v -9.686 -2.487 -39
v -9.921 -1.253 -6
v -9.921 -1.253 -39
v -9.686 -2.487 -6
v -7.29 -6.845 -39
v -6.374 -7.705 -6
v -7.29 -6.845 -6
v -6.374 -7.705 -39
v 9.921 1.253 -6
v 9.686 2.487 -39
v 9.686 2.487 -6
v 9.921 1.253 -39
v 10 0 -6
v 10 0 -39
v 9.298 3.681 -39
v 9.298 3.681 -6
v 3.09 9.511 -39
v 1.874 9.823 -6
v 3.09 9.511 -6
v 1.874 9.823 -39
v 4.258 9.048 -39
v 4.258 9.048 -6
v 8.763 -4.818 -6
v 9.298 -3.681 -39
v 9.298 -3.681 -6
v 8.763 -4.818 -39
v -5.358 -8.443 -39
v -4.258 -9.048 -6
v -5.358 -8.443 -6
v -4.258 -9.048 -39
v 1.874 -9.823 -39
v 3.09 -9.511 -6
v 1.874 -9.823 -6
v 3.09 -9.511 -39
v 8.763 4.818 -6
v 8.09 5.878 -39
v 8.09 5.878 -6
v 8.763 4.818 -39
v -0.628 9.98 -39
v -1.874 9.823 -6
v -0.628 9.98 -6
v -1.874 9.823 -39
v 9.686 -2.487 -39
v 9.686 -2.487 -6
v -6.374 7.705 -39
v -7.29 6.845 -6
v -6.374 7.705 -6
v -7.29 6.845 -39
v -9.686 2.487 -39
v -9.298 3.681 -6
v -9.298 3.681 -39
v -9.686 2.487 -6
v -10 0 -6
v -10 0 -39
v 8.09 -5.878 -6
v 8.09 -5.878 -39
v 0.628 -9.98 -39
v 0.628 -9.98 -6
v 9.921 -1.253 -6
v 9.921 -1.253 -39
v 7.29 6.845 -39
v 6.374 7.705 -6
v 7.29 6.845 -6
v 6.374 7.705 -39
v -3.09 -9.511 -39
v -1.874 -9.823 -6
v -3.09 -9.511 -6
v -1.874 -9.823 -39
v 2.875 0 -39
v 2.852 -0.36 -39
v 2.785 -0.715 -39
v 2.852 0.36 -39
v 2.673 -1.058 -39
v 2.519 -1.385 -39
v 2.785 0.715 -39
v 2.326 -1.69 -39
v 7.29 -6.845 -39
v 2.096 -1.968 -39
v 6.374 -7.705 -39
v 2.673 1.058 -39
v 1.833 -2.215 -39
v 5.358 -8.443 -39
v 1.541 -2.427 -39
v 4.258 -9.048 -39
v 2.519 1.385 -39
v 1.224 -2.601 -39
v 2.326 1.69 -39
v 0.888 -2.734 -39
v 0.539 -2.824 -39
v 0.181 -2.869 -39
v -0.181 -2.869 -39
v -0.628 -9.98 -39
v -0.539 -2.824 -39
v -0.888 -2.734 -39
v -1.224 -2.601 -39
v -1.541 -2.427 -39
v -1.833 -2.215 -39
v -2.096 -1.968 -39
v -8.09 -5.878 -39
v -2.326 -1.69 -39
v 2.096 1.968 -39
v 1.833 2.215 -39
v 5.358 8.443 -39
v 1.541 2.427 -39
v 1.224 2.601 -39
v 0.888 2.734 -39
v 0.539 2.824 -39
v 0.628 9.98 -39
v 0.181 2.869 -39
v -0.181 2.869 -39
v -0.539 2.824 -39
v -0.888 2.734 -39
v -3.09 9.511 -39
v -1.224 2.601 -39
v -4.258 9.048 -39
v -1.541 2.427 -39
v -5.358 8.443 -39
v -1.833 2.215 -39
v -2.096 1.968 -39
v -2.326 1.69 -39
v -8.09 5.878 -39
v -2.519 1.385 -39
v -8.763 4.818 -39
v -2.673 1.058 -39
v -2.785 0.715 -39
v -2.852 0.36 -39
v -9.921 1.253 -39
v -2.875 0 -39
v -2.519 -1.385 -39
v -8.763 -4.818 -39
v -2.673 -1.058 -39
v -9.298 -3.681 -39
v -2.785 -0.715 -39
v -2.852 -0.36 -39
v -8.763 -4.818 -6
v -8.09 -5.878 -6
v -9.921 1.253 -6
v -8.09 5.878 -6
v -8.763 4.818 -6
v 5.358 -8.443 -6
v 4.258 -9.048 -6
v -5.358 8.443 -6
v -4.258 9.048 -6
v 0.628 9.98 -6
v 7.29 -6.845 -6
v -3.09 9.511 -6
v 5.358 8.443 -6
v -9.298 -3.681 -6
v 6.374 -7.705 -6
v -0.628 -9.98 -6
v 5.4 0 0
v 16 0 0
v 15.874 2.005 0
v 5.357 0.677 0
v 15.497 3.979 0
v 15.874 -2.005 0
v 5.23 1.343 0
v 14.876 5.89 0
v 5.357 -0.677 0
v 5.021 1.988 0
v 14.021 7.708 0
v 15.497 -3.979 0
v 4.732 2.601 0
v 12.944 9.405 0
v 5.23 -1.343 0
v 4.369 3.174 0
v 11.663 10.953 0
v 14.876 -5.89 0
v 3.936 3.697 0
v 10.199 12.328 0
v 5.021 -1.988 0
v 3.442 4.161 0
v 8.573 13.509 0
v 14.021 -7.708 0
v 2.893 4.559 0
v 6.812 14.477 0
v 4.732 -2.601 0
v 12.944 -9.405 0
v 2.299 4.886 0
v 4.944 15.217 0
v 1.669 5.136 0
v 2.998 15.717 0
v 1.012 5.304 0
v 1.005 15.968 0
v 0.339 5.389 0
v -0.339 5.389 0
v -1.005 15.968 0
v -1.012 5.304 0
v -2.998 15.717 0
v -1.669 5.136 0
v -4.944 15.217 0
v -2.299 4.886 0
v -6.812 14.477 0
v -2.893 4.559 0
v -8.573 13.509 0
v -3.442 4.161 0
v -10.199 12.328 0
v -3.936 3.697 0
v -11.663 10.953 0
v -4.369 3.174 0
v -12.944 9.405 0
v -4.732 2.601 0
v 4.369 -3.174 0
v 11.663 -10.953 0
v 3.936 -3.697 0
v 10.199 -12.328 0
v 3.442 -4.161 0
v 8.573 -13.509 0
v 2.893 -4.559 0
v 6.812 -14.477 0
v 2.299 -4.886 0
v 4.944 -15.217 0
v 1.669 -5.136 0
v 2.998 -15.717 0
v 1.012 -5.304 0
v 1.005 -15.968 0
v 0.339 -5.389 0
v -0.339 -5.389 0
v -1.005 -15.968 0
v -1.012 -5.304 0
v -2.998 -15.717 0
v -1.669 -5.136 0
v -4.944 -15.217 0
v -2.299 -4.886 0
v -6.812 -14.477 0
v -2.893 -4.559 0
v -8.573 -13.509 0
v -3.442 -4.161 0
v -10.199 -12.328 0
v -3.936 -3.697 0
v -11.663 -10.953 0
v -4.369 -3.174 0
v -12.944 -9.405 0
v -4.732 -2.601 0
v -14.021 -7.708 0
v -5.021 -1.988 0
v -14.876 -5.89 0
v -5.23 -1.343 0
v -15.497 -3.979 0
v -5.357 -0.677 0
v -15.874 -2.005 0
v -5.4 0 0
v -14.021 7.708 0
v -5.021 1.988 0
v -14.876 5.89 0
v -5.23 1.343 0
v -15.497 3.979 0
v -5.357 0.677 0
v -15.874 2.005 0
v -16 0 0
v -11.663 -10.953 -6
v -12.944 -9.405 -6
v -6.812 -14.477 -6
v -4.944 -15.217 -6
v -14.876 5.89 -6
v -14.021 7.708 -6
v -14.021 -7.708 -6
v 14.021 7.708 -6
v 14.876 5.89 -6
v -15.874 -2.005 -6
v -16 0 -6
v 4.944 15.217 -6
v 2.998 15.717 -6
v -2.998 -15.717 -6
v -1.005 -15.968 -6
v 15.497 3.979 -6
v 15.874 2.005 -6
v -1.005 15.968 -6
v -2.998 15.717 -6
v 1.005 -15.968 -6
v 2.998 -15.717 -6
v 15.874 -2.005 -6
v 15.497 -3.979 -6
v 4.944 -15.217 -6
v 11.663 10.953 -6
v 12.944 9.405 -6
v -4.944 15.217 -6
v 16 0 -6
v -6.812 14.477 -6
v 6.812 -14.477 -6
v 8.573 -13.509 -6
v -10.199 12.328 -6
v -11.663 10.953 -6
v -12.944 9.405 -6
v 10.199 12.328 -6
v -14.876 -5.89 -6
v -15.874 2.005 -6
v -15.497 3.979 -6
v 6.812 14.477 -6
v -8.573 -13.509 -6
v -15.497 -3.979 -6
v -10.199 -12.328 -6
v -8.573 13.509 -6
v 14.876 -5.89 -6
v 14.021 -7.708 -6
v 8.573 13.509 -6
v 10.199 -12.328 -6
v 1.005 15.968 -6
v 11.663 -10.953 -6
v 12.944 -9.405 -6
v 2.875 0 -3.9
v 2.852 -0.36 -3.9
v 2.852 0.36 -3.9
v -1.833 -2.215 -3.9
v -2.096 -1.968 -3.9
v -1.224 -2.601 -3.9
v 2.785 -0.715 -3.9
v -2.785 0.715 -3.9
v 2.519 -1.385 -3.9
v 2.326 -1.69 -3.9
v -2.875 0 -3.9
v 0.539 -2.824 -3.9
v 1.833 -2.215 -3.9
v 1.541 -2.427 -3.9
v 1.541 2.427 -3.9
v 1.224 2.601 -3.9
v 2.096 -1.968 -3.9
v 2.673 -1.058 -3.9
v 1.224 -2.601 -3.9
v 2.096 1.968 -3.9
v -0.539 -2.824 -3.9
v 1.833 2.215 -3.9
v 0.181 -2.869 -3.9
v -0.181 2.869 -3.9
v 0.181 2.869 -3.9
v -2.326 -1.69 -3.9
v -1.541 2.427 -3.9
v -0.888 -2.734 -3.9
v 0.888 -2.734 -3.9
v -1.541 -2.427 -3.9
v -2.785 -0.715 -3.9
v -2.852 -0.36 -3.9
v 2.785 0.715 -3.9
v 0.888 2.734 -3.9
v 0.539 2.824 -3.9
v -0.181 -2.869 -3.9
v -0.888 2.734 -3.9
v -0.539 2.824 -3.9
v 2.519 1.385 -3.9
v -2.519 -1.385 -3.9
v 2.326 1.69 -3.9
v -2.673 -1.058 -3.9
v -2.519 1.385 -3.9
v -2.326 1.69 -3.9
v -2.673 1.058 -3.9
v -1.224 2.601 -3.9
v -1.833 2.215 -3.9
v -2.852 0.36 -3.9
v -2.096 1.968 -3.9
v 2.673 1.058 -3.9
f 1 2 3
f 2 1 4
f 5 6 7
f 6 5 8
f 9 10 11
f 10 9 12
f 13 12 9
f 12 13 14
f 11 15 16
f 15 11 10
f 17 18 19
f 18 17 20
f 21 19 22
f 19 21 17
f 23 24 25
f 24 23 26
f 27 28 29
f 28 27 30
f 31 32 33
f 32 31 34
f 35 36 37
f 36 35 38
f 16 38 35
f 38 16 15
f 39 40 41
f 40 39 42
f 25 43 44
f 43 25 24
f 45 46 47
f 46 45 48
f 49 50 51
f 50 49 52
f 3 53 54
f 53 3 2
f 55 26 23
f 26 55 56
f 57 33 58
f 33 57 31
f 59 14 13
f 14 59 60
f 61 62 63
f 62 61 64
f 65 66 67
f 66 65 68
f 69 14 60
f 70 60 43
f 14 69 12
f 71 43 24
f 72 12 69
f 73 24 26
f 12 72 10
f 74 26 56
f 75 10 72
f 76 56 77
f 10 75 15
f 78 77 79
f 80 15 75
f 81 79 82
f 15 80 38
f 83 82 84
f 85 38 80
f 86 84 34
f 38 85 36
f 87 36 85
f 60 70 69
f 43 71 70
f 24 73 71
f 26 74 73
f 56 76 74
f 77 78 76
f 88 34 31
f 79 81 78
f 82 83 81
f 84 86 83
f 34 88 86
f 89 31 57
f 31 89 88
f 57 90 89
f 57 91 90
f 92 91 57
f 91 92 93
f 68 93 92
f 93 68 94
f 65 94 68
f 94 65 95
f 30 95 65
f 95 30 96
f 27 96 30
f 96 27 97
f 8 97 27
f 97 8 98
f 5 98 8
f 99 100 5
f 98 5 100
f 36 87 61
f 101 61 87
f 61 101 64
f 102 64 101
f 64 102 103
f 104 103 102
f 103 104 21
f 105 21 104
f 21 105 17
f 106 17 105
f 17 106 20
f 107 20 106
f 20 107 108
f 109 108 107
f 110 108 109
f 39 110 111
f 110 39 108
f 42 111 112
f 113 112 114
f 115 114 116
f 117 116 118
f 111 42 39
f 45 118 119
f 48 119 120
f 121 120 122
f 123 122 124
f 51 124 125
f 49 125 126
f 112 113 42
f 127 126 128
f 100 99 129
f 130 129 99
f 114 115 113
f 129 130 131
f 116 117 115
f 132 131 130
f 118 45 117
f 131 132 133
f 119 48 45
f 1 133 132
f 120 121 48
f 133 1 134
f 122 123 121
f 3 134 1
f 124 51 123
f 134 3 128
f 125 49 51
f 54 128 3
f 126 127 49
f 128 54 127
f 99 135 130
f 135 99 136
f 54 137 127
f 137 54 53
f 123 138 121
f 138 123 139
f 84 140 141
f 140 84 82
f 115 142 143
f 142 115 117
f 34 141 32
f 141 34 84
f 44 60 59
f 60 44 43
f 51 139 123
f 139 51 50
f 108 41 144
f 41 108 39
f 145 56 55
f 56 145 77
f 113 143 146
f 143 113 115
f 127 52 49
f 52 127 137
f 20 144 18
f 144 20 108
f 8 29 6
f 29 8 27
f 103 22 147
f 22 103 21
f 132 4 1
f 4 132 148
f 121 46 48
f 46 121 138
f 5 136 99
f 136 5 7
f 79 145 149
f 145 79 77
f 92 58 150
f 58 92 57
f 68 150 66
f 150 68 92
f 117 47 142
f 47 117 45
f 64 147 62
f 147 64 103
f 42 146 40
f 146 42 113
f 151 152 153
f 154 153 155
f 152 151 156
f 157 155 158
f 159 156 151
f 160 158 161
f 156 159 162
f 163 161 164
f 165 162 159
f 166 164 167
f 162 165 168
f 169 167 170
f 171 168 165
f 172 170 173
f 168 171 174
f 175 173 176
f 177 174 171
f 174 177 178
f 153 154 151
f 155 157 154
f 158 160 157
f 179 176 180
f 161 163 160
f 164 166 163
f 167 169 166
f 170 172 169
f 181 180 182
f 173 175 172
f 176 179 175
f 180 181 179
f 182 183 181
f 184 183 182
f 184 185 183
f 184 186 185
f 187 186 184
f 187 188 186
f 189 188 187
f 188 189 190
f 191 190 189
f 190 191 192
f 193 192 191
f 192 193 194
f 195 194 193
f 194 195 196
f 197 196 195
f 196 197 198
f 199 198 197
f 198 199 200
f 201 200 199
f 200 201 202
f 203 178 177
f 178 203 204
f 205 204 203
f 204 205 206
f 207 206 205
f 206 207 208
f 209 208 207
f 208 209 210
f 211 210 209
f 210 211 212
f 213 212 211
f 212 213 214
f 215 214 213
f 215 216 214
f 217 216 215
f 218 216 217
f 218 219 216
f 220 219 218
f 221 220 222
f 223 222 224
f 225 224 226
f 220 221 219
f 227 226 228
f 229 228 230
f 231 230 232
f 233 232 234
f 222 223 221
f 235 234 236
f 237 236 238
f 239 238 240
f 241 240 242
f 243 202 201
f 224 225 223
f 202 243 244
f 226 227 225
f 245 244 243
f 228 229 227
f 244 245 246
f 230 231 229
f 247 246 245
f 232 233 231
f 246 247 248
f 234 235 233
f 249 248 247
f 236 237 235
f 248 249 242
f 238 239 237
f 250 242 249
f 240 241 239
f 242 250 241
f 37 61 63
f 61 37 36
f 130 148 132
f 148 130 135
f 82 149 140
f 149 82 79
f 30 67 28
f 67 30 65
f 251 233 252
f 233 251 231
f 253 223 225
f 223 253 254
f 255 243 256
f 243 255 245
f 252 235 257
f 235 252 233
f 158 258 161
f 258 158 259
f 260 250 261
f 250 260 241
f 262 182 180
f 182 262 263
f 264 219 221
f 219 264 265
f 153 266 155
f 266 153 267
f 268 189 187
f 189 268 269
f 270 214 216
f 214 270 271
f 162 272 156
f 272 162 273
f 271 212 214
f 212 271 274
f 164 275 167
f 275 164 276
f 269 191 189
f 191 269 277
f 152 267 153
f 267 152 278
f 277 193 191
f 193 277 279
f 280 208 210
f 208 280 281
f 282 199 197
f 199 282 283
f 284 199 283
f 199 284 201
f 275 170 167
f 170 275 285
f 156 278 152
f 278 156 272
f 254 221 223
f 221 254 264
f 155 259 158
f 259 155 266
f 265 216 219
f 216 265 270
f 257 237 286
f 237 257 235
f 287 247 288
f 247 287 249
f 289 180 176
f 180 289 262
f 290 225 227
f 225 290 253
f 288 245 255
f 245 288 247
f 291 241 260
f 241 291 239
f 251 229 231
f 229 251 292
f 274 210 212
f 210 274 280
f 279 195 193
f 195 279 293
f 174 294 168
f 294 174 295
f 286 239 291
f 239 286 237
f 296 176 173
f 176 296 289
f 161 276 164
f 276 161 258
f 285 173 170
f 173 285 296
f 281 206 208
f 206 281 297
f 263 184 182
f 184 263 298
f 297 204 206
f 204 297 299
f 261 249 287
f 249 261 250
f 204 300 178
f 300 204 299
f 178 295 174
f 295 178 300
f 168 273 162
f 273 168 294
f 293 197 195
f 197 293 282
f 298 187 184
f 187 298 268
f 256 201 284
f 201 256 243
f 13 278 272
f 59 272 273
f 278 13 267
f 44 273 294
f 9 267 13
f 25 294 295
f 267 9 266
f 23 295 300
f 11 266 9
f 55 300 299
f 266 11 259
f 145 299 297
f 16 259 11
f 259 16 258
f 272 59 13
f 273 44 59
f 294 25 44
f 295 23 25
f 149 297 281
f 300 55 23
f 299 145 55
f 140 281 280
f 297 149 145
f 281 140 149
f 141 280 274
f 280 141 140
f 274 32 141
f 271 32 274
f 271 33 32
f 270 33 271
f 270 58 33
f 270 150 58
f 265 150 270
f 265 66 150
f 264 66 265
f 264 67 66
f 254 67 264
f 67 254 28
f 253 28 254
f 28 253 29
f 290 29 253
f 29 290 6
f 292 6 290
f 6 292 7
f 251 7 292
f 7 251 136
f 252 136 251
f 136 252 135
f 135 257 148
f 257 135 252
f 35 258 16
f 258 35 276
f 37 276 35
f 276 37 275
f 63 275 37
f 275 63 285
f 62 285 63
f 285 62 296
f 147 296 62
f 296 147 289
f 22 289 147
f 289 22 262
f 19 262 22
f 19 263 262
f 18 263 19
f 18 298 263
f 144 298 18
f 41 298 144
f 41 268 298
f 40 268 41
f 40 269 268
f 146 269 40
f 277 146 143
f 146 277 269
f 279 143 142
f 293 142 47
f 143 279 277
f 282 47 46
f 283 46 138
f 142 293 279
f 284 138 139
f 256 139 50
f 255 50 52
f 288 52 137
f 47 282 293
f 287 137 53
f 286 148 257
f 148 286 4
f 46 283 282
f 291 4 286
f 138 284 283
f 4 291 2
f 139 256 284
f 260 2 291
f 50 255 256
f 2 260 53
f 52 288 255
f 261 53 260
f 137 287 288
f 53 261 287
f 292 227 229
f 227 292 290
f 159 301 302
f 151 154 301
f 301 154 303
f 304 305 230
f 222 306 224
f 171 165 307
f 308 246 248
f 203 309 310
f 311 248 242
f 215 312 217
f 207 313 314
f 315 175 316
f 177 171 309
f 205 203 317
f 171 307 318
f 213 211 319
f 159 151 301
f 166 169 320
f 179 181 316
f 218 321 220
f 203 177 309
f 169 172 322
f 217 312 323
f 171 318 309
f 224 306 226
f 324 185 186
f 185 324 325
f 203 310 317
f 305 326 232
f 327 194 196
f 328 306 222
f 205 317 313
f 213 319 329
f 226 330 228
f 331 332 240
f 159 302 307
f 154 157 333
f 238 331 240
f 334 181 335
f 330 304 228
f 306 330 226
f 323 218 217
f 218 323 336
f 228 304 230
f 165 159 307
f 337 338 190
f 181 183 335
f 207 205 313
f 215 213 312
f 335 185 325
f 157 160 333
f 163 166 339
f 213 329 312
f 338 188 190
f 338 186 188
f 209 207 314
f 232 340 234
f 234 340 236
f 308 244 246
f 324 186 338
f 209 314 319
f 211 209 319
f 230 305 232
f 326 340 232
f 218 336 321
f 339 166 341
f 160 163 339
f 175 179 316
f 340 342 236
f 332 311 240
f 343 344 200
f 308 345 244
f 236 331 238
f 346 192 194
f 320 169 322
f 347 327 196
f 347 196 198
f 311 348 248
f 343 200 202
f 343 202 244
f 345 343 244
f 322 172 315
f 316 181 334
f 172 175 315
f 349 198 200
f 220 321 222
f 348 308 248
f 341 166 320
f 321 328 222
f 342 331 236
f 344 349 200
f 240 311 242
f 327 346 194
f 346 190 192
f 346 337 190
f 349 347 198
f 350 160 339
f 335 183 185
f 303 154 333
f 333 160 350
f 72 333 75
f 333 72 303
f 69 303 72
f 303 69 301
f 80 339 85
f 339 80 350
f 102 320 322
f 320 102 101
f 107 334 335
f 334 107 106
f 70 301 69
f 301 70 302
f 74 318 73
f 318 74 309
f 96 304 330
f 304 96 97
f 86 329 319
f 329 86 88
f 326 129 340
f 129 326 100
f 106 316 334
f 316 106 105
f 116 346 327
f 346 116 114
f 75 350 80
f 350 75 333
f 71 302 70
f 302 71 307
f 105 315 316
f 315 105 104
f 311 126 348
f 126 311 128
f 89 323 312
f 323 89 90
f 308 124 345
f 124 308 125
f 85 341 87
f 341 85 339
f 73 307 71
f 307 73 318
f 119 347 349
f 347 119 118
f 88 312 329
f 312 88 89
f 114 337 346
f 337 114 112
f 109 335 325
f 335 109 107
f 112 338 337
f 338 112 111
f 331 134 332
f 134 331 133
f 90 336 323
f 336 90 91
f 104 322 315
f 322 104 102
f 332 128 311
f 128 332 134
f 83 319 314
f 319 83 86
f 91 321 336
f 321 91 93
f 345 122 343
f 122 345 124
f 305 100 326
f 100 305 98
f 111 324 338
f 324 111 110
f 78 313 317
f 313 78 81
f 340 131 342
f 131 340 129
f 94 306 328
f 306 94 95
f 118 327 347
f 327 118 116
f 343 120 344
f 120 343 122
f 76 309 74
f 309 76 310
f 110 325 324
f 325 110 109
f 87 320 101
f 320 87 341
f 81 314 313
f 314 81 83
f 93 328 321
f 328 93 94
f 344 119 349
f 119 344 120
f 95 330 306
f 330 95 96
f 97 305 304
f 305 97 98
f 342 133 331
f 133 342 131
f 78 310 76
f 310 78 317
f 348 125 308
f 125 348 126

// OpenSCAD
$fn = 50;


difference() {
	union() {
		translate(v = [0, 0, -39.0000000000]) {
			cylinder(h = 39, r = 10.0000000000);
		}
		translate(v = [0, 0, -6.0000000000]) {
			cylinder(h = 6, r = 16.0000000000);
		}
	}
	union() {
		translate(v = [0, 0, 0]) {
			rotate(a = [0, 0, 0]) {
				difference() {
					union() {
						#translate(v = [0, 0, -39.0000000000]) {
							cylinder(h = 39, r = 2.6000000000);
						}
						#translate(v = [0, 0, -3.9000000000]) {
							cylinder(h = 3.9000000000, r1 = 2.8750000000, r2 = 5.4000000000);
						}
						#translate(v = [0, 0, -39.0000000000]) {
							cylinder(h = 39, r = 2.8750000000);
						}
						#translate(v = [0, 0, -39.0000000000]) {
							cylinder(h = 39, r = 2.6000000000);
						}
					}
					union();
				}
			}
		}
	}
}
